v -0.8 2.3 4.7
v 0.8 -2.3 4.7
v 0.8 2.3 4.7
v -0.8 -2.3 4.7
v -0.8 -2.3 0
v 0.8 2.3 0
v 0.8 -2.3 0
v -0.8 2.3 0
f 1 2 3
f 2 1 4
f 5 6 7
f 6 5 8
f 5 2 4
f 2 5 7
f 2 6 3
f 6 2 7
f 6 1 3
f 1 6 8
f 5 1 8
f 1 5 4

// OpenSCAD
OH090U();

module OH090U()
{
    color("black")
    translate([0,0,4.7/2])
    cube([1.6, 4.6, 4.7], center=true);
}
